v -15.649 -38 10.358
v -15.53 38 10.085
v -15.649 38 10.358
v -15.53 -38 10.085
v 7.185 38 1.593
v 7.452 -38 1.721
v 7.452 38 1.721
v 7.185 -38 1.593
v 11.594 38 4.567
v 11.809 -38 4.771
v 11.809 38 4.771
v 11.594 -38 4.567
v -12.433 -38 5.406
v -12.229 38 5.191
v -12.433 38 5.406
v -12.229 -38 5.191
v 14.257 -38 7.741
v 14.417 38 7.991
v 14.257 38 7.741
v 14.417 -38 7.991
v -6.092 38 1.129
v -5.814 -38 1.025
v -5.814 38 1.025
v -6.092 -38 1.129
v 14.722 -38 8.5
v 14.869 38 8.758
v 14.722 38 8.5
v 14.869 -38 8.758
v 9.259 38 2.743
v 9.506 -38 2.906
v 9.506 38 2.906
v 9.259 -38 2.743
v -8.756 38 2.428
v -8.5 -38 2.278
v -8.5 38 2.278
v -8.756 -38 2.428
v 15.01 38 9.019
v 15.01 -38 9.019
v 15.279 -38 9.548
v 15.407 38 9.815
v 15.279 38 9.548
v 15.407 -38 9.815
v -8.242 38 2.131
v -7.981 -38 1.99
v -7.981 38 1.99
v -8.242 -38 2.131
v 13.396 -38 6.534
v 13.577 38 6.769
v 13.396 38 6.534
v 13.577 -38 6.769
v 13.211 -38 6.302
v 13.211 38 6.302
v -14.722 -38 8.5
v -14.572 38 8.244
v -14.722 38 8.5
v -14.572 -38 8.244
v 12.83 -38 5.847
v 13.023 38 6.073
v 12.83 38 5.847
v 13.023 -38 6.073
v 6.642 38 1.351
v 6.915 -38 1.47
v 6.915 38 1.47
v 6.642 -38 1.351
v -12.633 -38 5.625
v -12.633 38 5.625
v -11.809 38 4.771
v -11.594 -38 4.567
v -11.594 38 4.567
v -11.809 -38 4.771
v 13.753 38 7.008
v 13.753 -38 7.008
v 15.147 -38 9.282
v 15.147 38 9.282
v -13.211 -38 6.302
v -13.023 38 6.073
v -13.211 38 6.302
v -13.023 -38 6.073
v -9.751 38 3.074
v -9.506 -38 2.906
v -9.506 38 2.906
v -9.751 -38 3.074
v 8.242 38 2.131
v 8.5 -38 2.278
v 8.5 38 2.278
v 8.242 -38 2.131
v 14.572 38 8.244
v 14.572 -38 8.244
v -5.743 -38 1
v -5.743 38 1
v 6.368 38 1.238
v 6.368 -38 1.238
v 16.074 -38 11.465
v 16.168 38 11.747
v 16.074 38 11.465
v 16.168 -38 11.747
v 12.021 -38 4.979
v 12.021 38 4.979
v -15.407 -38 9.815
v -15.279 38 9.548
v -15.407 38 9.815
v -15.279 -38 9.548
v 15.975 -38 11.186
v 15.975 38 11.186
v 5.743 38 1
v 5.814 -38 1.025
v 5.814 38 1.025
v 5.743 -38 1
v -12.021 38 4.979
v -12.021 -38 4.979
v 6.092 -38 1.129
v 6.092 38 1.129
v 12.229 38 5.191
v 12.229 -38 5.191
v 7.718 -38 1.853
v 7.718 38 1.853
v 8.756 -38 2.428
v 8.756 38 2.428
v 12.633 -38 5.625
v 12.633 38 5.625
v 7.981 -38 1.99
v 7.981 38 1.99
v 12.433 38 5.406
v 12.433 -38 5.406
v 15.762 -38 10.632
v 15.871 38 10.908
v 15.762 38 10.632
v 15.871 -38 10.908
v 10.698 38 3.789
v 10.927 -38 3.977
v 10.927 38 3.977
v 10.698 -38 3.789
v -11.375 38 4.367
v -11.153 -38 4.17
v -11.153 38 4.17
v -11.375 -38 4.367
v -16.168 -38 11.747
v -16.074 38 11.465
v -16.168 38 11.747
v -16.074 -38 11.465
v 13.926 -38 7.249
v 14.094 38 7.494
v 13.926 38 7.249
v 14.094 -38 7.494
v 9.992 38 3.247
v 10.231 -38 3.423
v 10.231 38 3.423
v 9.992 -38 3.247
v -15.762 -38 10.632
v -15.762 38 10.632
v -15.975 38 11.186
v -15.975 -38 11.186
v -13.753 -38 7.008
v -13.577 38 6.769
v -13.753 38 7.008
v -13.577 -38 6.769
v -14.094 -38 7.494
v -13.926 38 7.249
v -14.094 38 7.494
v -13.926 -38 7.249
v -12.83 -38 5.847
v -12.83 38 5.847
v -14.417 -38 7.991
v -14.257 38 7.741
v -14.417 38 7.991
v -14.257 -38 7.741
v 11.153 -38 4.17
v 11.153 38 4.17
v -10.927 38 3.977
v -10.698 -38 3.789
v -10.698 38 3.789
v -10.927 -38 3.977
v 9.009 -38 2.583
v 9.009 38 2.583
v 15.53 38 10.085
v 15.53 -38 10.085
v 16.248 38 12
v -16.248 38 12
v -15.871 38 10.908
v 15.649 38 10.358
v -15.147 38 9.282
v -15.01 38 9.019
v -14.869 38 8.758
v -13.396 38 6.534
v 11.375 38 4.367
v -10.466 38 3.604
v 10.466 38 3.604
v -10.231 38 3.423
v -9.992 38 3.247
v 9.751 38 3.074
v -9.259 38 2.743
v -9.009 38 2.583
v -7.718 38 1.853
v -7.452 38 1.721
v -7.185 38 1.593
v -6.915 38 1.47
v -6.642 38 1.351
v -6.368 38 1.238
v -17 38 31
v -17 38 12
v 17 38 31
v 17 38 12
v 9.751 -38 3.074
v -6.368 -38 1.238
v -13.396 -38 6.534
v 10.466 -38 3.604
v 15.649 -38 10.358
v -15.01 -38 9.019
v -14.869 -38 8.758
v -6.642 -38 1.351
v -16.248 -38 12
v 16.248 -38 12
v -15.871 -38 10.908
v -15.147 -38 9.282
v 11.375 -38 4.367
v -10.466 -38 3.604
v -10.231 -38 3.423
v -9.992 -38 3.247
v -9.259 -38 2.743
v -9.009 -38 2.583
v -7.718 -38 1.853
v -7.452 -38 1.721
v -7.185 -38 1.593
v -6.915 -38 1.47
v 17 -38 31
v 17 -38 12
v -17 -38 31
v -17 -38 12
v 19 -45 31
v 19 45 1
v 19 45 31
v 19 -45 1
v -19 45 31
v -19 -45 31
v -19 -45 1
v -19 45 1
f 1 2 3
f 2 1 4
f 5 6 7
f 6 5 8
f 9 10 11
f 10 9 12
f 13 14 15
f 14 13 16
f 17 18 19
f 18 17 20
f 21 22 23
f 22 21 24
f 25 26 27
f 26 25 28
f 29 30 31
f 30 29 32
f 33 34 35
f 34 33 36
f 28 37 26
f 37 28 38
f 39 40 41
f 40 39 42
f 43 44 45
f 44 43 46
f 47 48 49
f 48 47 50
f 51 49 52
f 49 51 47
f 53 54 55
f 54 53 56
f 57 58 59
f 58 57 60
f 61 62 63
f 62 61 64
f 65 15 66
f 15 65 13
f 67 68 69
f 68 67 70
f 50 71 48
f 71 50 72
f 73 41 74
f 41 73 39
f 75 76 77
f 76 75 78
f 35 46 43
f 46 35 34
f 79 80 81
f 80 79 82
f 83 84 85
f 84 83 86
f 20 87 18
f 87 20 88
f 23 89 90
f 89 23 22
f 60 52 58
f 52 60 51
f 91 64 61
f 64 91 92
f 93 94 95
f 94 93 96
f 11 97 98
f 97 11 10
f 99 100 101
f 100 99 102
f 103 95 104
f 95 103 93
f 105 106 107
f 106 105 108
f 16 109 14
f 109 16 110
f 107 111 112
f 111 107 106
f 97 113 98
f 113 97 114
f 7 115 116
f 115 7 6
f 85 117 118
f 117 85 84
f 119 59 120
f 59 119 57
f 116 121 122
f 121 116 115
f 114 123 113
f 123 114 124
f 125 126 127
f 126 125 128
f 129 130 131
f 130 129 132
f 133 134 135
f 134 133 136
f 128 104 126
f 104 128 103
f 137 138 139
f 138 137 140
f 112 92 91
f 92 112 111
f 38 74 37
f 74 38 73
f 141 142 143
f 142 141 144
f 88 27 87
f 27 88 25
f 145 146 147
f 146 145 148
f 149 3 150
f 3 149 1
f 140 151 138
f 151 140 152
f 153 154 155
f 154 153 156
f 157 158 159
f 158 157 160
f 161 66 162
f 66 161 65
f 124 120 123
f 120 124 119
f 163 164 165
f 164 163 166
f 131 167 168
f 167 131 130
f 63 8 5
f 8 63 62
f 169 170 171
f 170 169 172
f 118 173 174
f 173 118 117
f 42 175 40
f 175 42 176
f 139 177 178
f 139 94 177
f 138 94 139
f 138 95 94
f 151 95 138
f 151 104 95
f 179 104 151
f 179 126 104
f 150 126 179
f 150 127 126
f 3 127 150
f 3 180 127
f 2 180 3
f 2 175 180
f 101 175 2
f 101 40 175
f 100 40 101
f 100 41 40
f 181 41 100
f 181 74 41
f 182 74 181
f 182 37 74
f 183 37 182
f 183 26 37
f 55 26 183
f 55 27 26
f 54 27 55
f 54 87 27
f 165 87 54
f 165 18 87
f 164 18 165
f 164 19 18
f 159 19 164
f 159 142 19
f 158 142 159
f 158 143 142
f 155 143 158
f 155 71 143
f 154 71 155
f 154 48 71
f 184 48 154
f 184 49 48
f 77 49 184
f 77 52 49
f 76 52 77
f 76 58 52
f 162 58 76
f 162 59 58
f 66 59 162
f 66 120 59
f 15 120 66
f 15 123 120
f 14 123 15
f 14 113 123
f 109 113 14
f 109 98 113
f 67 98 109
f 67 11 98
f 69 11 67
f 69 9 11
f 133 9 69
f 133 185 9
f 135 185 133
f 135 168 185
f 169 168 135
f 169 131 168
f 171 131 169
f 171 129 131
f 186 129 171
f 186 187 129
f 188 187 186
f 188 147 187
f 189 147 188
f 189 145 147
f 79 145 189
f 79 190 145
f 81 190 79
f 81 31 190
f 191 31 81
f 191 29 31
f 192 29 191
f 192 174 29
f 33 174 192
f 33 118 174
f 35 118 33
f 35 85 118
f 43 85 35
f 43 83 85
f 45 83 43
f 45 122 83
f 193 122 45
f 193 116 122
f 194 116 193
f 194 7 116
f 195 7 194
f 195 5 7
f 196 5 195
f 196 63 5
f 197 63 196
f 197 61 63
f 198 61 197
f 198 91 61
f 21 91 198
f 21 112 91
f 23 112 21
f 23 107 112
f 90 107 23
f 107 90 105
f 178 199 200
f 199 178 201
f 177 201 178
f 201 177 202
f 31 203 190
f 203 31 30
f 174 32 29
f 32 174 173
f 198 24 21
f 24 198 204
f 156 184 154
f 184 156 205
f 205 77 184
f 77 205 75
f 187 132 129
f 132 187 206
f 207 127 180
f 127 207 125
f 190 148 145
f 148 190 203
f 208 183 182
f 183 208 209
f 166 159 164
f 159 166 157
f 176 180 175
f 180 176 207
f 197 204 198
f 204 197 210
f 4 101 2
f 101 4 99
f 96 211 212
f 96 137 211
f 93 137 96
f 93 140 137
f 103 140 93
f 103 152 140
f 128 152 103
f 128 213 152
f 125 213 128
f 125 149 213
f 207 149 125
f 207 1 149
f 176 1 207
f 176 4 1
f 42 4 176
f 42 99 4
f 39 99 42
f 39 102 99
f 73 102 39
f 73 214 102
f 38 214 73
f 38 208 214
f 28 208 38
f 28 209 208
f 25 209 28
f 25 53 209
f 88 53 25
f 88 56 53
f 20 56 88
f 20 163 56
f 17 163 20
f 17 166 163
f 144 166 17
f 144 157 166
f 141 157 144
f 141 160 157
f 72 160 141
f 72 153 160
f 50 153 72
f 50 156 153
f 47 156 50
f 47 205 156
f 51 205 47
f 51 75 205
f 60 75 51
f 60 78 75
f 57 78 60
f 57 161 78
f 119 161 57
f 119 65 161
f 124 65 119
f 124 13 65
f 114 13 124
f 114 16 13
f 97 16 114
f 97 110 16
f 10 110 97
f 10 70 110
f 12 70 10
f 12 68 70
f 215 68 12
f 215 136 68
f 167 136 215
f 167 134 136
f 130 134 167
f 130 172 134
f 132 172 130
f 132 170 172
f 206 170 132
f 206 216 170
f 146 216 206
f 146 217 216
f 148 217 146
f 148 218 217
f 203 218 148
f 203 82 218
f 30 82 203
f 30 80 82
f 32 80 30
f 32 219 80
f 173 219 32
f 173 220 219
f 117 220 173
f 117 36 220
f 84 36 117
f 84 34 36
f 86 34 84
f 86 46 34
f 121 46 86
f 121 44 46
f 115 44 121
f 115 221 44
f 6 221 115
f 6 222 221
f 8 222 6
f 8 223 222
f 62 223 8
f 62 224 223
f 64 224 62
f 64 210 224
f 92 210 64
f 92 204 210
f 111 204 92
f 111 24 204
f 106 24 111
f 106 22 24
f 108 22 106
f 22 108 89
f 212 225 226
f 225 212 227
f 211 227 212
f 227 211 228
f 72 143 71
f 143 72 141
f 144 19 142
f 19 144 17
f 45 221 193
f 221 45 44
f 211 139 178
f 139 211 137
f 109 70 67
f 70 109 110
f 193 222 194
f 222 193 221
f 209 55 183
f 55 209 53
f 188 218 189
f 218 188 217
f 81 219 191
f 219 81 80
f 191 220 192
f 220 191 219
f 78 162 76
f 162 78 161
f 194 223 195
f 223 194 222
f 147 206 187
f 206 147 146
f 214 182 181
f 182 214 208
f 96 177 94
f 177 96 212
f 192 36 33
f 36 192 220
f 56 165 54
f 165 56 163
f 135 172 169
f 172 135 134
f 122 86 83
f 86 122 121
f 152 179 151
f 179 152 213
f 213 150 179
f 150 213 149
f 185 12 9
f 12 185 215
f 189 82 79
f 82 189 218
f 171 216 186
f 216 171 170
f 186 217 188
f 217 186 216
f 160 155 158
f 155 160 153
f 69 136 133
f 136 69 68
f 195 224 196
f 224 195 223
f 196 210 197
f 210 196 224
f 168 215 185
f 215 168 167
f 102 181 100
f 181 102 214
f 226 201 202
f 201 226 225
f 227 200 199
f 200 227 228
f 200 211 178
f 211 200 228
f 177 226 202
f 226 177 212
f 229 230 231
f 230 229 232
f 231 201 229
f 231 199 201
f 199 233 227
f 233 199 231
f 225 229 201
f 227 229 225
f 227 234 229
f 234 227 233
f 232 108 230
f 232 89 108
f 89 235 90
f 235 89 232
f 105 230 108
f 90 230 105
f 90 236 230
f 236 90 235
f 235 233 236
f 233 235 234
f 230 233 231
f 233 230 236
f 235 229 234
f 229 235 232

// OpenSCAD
$fn=360;

difference() {
    translate([0, 0, 16]){
        cube([38, 90, 30], true);
    }
    translate([0, 0, 17]){
        rotate([90, 0, 0]) {
            cylinder(76, d=34, center=true);
            translate([0, 5, 0]) {
                cube([34, 20, 76], true);
            }
        }
    }
}
